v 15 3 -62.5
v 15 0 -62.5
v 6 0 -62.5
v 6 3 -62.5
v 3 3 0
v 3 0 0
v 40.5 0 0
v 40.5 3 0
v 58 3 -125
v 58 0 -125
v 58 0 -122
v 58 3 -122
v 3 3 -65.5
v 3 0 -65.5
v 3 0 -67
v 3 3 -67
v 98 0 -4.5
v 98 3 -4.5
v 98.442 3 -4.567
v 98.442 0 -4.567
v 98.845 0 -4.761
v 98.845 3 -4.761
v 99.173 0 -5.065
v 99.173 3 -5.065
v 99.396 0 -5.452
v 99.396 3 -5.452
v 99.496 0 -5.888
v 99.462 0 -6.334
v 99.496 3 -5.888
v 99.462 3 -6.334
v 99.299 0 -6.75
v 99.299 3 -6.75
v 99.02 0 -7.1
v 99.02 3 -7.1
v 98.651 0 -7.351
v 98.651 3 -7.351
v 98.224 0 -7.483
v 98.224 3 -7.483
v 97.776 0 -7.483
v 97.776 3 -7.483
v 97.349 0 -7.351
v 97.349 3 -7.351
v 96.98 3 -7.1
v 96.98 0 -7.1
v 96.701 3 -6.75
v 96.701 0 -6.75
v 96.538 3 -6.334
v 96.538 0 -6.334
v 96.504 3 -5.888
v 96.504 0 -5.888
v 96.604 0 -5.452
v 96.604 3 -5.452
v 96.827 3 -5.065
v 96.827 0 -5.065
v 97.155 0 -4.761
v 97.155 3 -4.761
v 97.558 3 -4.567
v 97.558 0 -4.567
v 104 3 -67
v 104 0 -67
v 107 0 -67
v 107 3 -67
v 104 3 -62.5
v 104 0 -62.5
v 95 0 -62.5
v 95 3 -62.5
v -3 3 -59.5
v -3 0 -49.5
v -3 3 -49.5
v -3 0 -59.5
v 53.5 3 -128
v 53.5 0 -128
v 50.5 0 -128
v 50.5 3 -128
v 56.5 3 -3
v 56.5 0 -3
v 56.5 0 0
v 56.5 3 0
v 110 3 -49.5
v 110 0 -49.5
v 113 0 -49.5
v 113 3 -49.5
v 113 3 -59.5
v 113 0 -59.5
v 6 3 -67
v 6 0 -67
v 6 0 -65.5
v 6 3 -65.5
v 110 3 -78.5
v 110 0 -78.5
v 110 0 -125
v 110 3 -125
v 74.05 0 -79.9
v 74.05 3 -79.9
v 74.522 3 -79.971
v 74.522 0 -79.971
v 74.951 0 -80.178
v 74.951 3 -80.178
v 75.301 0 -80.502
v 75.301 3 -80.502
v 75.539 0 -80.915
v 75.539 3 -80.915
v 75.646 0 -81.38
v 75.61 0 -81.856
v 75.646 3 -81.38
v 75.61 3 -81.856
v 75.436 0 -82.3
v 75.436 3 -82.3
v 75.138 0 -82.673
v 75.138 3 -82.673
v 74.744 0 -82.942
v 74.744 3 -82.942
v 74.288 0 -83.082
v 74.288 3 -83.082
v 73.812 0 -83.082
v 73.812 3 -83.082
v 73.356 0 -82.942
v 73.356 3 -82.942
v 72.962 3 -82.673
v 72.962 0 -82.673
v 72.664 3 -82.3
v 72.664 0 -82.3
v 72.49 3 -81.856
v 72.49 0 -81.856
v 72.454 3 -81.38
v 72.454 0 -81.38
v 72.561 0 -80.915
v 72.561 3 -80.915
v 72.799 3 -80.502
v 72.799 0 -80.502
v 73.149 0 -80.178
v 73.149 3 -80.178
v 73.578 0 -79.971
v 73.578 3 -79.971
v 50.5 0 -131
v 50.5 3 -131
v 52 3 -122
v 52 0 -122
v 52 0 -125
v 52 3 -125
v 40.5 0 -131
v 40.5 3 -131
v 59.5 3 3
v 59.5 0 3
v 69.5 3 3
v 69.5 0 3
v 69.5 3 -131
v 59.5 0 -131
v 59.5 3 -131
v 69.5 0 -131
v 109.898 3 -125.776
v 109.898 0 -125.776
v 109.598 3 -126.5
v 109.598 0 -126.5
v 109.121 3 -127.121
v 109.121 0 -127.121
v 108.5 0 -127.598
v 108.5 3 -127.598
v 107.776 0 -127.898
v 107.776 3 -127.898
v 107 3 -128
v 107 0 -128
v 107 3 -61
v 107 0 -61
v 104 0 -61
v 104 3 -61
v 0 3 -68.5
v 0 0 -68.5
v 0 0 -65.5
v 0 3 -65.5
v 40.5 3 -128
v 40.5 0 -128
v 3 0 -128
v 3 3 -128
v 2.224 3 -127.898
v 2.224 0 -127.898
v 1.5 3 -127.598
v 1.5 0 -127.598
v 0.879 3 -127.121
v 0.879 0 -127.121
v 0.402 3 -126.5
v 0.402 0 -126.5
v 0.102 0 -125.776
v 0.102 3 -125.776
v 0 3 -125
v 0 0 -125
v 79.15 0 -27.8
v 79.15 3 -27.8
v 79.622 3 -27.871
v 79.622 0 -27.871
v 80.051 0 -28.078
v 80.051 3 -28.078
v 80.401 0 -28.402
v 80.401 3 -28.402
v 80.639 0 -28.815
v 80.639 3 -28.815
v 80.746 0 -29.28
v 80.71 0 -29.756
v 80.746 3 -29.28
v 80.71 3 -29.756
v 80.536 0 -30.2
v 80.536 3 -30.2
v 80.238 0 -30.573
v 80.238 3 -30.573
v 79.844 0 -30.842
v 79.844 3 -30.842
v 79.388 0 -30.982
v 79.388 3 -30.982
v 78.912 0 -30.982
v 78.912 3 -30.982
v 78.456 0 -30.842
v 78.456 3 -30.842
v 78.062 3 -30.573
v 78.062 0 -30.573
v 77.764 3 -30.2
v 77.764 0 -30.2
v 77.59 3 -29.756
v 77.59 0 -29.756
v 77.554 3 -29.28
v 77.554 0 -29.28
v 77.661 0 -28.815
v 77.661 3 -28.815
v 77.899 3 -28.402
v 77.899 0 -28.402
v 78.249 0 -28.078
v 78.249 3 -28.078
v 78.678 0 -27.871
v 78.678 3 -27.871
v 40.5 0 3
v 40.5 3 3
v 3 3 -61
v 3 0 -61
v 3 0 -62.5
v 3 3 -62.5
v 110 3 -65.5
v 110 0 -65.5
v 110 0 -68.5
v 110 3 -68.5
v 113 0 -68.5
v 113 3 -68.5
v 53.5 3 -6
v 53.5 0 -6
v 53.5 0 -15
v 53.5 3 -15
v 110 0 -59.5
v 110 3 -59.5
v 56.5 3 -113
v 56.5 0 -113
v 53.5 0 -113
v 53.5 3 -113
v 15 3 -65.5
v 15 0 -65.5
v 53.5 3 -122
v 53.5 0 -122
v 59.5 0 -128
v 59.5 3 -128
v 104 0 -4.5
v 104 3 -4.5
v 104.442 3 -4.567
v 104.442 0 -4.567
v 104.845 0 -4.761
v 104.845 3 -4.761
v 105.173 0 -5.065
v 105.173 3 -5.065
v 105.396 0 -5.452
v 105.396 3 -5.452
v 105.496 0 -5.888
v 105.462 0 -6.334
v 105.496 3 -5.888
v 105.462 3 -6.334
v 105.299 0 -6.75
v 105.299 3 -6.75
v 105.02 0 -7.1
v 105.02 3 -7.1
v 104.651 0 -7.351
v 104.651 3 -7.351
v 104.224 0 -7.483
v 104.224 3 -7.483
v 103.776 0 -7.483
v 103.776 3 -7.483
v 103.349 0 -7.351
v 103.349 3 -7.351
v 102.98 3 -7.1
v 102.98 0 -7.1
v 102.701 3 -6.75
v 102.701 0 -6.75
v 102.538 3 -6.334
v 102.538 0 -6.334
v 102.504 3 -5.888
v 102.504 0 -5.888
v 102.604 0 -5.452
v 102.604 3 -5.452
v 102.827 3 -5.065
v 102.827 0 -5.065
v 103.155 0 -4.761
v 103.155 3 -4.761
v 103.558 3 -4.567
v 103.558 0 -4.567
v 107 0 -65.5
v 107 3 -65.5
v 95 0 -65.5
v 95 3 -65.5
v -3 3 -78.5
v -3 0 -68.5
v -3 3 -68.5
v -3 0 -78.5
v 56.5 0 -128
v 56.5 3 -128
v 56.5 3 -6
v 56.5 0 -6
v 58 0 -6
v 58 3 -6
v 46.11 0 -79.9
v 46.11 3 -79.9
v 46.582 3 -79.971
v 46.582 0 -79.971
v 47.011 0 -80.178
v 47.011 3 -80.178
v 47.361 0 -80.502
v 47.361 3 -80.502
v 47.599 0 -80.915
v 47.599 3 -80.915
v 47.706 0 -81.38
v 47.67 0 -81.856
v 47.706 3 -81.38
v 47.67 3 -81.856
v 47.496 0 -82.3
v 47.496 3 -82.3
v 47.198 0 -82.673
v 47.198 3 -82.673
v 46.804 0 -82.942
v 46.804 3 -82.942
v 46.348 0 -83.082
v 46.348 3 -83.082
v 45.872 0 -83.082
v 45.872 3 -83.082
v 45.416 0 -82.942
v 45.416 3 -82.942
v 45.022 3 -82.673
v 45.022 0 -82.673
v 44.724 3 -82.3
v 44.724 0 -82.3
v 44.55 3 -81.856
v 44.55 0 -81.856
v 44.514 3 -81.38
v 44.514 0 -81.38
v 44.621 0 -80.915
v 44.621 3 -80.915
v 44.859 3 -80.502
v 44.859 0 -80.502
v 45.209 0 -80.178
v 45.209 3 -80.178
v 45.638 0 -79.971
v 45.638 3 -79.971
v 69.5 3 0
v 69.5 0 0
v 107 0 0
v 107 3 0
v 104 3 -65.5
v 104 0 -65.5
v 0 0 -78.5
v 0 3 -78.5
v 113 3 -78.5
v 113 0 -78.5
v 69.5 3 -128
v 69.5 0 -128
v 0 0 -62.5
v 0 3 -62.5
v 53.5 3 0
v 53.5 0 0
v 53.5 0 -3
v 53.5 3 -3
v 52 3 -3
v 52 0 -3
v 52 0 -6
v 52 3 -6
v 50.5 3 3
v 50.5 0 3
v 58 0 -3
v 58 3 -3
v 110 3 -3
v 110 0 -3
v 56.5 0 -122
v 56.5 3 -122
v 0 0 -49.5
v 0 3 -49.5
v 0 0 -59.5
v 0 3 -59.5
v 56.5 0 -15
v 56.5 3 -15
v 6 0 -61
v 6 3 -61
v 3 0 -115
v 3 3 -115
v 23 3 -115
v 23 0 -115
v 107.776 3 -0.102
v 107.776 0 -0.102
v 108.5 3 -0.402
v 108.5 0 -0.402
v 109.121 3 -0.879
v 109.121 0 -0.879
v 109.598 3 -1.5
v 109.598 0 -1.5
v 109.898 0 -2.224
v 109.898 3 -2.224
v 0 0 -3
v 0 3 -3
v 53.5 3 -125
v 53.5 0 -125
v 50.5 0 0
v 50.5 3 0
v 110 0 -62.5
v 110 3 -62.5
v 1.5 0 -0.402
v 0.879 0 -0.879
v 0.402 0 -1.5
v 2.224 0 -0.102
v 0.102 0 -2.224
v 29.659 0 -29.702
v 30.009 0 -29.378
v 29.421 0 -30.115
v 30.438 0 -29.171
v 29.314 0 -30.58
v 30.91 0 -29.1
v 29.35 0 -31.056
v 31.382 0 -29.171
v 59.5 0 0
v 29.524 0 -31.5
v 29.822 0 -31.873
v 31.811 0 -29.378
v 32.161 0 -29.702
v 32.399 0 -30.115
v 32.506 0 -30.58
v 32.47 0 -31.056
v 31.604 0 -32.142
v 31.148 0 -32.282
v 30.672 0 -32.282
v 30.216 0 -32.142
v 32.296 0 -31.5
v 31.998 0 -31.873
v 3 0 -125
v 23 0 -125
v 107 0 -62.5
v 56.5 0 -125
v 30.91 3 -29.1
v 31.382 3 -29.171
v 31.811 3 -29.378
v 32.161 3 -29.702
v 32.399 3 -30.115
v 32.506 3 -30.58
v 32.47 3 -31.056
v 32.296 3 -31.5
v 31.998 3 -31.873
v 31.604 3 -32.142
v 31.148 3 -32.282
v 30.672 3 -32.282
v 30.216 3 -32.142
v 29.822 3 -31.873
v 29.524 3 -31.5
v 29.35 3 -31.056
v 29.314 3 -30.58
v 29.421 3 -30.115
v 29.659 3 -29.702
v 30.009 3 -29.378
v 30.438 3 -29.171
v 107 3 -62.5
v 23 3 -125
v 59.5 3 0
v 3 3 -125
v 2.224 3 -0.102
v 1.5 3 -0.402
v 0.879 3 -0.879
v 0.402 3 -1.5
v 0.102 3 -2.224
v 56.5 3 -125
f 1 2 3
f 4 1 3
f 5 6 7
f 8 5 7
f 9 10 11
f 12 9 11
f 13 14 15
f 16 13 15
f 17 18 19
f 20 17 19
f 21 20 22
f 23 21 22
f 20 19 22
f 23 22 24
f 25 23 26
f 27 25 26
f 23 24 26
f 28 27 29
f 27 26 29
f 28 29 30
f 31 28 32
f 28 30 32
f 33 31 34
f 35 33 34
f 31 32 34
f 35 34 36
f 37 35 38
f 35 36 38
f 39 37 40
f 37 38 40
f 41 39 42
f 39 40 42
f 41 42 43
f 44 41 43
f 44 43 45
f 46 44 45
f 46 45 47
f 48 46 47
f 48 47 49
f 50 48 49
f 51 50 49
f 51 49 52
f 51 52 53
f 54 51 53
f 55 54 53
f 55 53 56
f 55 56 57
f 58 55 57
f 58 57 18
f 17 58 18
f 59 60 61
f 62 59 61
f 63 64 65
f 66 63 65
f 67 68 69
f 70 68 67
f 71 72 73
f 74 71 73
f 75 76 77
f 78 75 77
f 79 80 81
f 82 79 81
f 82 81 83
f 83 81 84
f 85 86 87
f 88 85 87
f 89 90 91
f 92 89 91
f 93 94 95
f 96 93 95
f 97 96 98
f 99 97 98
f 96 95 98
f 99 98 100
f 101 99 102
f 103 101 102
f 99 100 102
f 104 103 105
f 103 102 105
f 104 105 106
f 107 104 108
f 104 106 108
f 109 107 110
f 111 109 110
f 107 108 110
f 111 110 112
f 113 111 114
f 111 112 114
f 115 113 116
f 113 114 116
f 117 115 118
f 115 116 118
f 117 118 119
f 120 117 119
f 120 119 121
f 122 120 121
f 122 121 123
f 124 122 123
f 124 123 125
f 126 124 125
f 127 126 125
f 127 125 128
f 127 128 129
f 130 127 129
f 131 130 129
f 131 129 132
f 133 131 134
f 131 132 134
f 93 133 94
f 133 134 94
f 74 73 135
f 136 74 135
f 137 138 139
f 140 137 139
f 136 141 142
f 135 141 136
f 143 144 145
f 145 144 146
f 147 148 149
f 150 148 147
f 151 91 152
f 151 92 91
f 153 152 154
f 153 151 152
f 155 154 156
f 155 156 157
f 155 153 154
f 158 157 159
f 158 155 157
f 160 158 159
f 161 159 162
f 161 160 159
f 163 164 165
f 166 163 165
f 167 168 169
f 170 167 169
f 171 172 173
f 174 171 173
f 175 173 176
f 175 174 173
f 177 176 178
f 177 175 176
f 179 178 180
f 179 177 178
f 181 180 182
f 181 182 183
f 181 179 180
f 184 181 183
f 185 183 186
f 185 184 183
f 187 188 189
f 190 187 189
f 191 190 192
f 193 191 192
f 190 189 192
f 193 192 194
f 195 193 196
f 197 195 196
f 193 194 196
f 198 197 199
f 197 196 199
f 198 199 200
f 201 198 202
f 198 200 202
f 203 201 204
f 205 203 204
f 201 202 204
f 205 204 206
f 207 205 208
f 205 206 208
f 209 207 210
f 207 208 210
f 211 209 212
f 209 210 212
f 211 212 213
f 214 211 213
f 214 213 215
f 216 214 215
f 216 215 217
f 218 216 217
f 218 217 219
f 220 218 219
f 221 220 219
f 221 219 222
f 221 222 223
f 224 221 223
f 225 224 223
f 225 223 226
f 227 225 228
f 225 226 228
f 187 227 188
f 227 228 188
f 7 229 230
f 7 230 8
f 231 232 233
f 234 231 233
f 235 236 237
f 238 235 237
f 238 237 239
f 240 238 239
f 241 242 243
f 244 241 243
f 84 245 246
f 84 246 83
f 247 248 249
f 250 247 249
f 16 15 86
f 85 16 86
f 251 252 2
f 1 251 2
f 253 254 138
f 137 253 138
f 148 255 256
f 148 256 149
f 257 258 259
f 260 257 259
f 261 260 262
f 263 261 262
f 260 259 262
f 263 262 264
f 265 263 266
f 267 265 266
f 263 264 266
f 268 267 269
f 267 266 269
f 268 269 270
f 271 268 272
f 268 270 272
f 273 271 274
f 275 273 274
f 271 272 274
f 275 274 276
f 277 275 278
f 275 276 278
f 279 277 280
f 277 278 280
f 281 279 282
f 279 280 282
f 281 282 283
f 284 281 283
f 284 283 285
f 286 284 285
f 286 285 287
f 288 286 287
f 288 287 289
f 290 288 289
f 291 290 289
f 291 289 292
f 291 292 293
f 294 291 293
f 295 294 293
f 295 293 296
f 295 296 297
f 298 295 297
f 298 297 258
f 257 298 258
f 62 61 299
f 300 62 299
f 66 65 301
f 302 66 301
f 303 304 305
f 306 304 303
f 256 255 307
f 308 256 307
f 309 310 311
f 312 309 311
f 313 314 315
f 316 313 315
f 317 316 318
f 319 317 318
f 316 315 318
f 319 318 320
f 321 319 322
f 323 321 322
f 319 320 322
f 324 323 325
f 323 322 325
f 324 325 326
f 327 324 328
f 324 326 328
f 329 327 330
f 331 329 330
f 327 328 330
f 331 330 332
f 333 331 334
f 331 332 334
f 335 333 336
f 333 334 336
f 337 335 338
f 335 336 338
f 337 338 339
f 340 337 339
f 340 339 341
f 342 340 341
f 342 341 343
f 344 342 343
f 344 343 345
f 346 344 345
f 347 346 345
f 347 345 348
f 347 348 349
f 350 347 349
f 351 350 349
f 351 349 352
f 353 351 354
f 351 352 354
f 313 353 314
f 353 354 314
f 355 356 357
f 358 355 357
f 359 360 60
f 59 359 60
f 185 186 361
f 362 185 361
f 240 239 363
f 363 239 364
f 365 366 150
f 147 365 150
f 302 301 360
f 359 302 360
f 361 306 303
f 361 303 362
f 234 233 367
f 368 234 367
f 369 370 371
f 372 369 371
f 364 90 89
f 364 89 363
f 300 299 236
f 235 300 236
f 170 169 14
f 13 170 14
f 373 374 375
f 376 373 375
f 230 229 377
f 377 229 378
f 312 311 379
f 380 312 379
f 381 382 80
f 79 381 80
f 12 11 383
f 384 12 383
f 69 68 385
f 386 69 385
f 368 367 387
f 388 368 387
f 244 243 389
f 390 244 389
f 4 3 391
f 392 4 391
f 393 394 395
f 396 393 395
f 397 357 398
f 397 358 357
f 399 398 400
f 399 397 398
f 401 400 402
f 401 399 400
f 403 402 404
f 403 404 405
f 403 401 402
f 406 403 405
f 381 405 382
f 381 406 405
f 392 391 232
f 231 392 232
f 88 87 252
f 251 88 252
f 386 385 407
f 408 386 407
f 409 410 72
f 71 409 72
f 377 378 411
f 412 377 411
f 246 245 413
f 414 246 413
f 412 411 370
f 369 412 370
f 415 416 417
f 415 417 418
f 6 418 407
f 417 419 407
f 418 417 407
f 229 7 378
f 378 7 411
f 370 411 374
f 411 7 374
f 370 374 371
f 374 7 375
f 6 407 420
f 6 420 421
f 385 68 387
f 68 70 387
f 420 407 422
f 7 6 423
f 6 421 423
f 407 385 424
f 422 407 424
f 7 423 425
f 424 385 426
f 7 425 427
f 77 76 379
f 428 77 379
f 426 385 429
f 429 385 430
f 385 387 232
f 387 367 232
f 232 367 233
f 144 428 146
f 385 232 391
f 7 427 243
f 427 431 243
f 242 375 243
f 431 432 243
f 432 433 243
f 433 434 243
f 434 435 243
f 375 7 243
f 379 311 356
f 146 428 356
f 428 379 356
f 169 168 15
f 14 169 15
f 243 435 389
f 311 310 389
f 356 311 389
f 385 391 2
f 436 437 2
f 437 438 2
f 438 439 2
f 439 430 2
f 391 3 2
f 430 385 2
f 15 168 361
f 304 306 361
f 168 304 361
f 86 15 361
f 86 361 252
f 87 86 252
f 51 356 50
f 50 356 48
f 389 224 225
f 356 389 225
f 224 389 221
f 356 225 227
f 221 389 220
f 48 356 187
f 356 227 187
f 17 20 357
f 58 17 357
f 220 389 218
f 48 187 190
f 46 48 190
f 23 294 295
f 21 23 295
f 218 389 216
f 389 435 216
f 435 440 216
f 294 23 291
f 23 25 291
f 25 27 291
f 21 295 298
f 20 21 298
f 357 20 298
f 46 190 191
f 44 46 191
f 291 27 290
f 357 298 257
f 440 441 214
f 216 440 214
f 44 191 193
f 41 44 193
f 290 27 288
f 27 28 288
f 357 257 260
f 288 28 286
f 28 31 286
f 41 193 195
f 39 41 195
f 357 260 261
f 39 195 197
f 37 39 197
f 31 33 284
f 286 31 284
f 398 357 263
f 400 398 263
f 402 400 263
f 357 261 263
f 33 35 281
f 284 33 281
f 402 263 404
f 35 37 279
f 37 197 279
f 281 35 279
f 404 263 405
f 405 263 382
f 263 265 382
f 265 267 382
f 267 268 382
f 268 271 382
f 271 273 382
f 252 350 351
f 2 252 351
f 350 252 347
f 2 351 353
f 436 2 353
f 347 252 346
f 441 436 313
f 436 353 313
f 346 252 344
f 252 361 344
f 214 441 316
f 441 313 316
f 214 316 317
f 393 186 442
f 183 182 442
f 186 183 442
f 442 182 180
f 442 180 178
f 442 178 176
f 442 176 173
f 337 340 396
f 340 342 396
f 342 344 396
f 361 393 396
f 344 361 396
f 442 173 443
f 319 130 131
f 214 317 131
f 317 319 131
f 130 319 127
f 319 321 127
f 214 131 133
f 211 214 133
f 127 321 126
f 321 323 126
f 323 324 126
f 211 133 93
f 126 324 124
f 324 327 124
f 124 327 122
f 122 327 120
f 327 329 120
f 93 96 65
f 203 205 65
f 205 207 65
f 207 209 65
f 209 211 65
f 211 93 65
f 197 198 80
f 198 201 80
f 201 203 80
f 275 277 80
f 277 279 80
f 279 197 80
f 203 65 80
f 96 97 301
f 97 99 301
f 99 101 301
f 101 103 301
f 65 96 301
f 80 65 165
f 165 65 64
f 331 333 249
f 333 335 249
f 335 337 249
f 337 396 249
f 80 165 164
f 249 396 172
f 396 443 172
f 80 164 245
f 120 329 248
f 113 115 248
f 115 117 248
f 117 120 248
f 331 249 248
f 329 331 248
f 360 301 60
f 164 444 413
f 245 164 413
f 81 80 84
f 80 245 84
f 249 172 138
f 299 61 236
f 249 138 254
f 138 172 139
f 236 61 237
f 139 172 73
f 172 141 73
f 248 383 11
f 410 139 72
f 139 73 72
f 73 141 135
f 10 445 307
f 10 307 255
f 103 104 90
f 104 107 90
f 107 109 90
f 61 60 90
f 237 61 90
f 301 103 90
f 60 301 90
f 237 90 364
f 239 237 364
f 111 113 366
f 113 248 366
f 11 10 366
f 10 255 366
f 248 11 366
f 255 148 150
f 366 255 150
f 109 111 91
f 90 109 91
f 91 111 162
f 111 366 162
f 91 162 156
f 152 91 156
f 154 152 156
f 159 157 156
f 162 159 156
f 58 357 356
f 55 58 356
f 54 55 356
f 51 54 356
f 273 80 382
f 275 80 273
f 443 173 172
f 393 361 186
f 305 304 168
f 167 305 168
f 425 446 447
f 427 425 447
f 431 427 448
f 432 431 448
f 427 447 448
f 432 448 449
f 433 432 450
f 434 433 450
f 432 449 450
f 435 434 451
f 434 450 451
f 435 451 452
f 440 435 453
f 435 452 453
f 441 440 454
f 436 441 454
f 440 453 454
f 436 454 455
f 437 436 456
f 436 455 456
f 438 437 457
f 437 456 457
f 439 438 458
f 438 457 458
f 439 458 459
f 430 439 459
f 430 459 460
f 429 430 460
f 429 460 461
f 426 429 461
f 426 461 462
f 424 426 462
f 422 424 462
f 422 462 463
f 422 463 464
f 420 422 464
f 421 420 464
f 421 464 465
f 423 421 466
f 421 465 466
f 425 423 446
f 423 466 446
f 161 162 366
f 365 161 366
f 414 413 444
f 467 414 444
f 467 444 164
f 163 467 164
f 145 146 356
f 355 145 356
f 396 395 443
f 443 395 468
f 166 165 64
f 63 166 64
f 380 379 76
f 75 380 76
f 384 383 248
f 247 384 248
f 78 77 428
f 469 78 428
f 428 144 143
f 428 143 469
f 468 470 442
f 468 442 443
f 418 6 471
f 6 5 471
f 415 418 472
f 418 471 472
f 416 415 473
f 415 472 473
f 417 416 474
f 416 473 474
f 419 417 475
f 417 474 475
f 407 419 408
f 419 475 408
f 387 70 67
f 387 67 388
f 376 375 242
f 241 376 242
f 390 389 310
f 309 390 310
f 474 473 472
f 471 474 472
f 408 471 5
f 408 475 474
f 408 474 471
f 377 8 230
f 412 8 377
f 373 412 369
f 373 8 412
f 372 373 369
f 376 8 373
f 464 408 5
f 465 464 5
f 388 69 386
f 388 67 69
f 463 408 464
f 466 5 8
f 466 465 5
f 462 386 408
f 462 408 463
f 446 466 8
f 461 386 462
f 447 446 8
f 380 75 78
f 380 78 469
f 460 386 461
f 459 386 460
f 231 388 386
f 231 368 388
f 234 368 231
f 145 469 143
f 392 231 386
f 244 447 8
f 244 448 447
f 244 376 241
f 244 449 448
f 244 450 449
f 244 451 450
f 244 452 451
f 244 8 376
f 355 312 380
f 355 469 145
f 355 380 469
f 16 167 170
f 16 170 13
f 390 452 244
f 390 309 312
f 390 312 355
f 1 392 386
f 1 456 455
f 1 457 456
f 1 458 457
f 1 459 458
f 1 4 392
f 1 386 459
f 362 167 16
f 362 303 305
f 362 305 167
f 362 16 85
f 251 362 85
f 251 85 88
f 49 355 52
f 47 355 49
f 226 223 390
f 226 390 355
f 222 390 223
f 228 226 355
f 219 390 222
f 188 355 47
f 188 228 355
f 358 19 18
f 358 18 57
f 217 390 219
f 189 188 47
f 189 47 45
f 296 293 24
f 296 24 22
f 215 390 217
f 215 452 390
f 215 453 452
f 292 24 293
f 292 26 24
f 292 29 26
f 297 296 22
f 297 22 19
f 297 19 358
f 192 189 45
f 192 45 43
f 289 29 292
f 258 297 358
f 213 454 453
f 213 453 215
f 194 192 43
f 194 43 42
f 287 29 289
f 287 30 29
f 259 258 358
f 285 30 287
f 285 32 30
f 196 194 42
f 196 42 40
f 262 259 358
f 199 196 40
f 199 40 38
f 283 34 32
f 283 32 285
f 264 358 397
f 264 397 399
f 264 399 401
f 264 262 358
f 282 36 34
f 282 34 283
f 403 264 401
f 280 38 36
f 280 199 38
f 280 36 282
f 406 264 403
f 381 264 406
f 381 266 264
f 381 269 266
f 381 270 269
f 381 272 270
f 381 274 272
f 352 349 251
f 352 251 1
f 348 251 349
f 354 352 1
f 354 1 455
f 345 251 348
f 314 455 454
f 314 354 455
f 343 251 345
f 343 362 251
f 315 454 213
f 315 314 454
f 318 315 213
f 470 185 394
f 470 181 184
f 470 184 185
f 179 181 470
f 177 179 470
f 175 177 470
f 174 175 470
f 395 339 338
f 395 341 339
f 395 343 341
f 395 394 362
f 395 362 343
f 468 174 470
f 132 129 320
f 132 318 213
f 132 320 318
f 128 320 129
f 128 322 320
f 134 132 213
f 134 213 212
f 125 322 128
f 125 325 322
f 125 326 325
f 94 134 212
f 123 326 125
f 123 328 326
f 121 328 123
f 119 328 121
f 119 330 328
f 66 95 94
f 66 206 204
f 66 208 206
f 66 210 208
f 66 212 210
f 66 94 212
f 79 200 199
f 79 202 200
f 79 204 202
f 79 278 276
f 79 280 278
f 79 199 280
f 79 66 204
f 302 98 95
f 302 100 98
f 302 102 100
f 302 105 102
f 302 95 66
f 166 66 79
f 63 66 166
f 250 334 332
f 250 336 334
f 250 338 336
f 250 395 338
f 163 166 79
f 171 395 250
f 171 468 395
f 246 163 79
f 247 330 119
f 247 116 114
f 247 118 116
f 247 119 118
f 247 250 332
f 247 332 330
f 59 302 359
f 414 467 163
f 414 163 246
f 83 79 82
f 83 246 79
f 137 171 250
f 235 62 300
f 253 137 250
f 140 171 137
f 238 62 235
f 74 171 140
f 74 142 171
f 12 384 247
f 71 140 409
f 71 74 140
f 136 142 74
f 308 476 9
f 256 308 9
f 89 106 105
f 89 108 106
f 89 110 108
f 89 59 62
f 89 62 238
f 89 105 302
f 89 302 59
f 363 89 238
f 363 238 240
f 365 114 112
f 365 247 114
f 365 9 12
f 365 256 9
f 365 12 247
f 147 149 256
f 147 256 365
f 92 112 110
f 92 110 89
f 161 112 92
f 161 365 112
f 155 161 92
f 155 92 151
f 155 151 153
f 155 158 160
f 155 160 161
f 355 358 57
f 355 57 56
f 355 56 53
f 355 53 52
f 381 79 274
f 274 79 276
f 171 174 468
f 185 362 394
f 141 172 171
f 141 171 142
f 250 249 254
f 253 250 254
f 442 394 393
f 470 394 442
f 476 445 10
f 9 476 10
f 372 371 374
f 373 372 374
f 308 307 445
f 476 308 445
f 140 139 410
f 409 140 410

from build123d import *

# Parameters (mm, degrees)
SKETCH1_W           = 3
SKETCH1_H           = 10
SKETCH1_W_2         = 10
SKETCH1_H_2         = 3
BOSS_EXTRUDE2_DEPTH = 3
FILLET1_R           = 3
SKETCH2_R           = 1.6
CUT_EXTRUDE1_DEPTH  = 3
SKETCH3_R           = 1.5
CUT_EXTRUDE2_DEPTH  = 10
SKETCH4_W           = 20
SKETCH4_H           = 10
CUT_EXTRUDE3_DEPTH  = 10


with BuildPart() as part:
    # Sketch1 → Boss-Extrude2 (new body)
    with BuildSketch(Plane(origin=(0, 0, 0), x_dir=(1, 0, 0), z_dir=(0, 1, 0))):
        Polygon((0, 49.5), (0, 0), (40.5, 0), (50.5, 0), (53.5, 0), (53.5, 3), (52, 3), (52, 6), (53.5, 6), (53.5, 15), (56.5, 15), (56.5, 6), (58, 6), (58, 3), (56.5, 3), (56.5, 0), (59.5, 0), (69.5, 0), (110, 0), (110, 49.5), (110, 59.5), (110, 62.5), (107, 62.5), (107, 61), (104, 61), (104, 62.5), (95, 62.5), (95, 65.5), (104, 65.5), (104, 67), (107, 67), (107, 65.5), (110, 65.5), (110, 68.5), (110, 78.5), (110, 128), (69.5, 128), (59.5, 128), (56.5, 128), (56.5, 125), (58, 125), (58, 122), (56.5, 122), (56.5, 113), (53.5, 113), (53.5, 122), (52, 122), (52, 125), (53.5, 125), (53.5, 128), (50.5, 128), (40.5, 128), (0, 128), (0, 78.5), (0, 68.5), (0, 65.5), (3, 65.5), (3, 67), (6, 67), (6, 65.5), (15, 65.5), (15, 62.5), (6, 62.5), (6, 61), (3, 61), (3, 62.5), (0, 62.5), (0, 59.5), align=None)
        with Locations((111.5, 73.5)):
            Rectangle(SKETCH1_W, SKETCH1_H)
        with Locations((-1.5, 54.5)):
            Rectangle(SKETCH1_W, SKETCH1_H)
        with Locations((-1.5, 73.5)):
            Rectangle(SKETCH1_W, SKETCH1_H)
        with Locations((45.5, -1.5)):
            Rectangle(SKETCH1_W_2, SKETCH1_H_2)
        with Locations((45.5, 129.5)):
            Rectangle(SKETCH1_W_2, SKETCH1_H_2)
        with Locations((64.5, 129.5)):
            Rectangle(SKETCH1_W_2, SKETCH1_H_2)
        with Locations((64.5, -1.5)):
            Rectangle(SKETCH1_W_2, SKETCH1_H_2)
        with Locations((111.5, 54.5)):
            Rectangle(SKETCH1_W, SKETCH1_H)
    extrude(amount=BOSS_EXTRUDE2_DEPTH)

    # Fillet1
    fillet1_edges = [part.edges().sort_by_distance(p)[0] for p in [
        (0, 1.5, 0),
        (0, 1.5, -128),
        (110, 1.5, -128),
        (110, 1.5, 0),
    ]]
    fillet(fillet1_edges, radius=FILLET1_R)

    # Sketch2 → Cut-Extrude1 (cut)
    with BuildSketch(Plane(origin=(0, 3, 0), x_dir=(1, 0, 0), z_dir=(0, 1, 0))):
        with Locations(Location((74.05, 81.5, 0), (0, 0, 270))):
            Circle(SKETCH2_R)
        with Locations(Location((46.11, 81.5, 0), (0, 0, 270))):
            Circle(SKETCH2_R)
        with Locations(Location((79.15, 29.4, 0), (0, 0, 270))):
            Circle(SKETCH2_R)
        with Locations(Location((30.91, 30.7, 0), (0, 0, 270))):
            Circle(SKETCH2_R)
    extrude(amount=-CUT_EXTRUDE1_DEPTH, mode=Mode.SUBTRACT)

    # Sketch3 → Cut-Extrude2 (cut)
    with BuildSketch(Plane(origin=(0, 3, 0), x_dir=(1, 0, 0), z_dir=(0, 1, 0))):
        with Locations(Location((98, 6, 0), (0, 0, 270))):
            Circle(SKETCH3_R)
        with Locations(Location((104, 6, 0), (0, 0, 270))):
            Circle(SKETCH3_R)
    extrude(amount=-CUT_EXTRUDE2_DEPTH, mode=Mode.SUBTRACT)

    # Sketch4 → Cut-Extrude3 (cut)
    with BuildSketch(Plane(origin=(0, 3, 0), x_dir=(1, 0, 0), z_dir=(0, 1, 0))):
        with Locations((13, 120)):
            Rectangle(SKETCH4_W, SKETCH4_H)
    extrude(amount=-CUT_EXTRUDE3_DEPTH, mode=Mode.SUBTRACT)


solid = part.part
